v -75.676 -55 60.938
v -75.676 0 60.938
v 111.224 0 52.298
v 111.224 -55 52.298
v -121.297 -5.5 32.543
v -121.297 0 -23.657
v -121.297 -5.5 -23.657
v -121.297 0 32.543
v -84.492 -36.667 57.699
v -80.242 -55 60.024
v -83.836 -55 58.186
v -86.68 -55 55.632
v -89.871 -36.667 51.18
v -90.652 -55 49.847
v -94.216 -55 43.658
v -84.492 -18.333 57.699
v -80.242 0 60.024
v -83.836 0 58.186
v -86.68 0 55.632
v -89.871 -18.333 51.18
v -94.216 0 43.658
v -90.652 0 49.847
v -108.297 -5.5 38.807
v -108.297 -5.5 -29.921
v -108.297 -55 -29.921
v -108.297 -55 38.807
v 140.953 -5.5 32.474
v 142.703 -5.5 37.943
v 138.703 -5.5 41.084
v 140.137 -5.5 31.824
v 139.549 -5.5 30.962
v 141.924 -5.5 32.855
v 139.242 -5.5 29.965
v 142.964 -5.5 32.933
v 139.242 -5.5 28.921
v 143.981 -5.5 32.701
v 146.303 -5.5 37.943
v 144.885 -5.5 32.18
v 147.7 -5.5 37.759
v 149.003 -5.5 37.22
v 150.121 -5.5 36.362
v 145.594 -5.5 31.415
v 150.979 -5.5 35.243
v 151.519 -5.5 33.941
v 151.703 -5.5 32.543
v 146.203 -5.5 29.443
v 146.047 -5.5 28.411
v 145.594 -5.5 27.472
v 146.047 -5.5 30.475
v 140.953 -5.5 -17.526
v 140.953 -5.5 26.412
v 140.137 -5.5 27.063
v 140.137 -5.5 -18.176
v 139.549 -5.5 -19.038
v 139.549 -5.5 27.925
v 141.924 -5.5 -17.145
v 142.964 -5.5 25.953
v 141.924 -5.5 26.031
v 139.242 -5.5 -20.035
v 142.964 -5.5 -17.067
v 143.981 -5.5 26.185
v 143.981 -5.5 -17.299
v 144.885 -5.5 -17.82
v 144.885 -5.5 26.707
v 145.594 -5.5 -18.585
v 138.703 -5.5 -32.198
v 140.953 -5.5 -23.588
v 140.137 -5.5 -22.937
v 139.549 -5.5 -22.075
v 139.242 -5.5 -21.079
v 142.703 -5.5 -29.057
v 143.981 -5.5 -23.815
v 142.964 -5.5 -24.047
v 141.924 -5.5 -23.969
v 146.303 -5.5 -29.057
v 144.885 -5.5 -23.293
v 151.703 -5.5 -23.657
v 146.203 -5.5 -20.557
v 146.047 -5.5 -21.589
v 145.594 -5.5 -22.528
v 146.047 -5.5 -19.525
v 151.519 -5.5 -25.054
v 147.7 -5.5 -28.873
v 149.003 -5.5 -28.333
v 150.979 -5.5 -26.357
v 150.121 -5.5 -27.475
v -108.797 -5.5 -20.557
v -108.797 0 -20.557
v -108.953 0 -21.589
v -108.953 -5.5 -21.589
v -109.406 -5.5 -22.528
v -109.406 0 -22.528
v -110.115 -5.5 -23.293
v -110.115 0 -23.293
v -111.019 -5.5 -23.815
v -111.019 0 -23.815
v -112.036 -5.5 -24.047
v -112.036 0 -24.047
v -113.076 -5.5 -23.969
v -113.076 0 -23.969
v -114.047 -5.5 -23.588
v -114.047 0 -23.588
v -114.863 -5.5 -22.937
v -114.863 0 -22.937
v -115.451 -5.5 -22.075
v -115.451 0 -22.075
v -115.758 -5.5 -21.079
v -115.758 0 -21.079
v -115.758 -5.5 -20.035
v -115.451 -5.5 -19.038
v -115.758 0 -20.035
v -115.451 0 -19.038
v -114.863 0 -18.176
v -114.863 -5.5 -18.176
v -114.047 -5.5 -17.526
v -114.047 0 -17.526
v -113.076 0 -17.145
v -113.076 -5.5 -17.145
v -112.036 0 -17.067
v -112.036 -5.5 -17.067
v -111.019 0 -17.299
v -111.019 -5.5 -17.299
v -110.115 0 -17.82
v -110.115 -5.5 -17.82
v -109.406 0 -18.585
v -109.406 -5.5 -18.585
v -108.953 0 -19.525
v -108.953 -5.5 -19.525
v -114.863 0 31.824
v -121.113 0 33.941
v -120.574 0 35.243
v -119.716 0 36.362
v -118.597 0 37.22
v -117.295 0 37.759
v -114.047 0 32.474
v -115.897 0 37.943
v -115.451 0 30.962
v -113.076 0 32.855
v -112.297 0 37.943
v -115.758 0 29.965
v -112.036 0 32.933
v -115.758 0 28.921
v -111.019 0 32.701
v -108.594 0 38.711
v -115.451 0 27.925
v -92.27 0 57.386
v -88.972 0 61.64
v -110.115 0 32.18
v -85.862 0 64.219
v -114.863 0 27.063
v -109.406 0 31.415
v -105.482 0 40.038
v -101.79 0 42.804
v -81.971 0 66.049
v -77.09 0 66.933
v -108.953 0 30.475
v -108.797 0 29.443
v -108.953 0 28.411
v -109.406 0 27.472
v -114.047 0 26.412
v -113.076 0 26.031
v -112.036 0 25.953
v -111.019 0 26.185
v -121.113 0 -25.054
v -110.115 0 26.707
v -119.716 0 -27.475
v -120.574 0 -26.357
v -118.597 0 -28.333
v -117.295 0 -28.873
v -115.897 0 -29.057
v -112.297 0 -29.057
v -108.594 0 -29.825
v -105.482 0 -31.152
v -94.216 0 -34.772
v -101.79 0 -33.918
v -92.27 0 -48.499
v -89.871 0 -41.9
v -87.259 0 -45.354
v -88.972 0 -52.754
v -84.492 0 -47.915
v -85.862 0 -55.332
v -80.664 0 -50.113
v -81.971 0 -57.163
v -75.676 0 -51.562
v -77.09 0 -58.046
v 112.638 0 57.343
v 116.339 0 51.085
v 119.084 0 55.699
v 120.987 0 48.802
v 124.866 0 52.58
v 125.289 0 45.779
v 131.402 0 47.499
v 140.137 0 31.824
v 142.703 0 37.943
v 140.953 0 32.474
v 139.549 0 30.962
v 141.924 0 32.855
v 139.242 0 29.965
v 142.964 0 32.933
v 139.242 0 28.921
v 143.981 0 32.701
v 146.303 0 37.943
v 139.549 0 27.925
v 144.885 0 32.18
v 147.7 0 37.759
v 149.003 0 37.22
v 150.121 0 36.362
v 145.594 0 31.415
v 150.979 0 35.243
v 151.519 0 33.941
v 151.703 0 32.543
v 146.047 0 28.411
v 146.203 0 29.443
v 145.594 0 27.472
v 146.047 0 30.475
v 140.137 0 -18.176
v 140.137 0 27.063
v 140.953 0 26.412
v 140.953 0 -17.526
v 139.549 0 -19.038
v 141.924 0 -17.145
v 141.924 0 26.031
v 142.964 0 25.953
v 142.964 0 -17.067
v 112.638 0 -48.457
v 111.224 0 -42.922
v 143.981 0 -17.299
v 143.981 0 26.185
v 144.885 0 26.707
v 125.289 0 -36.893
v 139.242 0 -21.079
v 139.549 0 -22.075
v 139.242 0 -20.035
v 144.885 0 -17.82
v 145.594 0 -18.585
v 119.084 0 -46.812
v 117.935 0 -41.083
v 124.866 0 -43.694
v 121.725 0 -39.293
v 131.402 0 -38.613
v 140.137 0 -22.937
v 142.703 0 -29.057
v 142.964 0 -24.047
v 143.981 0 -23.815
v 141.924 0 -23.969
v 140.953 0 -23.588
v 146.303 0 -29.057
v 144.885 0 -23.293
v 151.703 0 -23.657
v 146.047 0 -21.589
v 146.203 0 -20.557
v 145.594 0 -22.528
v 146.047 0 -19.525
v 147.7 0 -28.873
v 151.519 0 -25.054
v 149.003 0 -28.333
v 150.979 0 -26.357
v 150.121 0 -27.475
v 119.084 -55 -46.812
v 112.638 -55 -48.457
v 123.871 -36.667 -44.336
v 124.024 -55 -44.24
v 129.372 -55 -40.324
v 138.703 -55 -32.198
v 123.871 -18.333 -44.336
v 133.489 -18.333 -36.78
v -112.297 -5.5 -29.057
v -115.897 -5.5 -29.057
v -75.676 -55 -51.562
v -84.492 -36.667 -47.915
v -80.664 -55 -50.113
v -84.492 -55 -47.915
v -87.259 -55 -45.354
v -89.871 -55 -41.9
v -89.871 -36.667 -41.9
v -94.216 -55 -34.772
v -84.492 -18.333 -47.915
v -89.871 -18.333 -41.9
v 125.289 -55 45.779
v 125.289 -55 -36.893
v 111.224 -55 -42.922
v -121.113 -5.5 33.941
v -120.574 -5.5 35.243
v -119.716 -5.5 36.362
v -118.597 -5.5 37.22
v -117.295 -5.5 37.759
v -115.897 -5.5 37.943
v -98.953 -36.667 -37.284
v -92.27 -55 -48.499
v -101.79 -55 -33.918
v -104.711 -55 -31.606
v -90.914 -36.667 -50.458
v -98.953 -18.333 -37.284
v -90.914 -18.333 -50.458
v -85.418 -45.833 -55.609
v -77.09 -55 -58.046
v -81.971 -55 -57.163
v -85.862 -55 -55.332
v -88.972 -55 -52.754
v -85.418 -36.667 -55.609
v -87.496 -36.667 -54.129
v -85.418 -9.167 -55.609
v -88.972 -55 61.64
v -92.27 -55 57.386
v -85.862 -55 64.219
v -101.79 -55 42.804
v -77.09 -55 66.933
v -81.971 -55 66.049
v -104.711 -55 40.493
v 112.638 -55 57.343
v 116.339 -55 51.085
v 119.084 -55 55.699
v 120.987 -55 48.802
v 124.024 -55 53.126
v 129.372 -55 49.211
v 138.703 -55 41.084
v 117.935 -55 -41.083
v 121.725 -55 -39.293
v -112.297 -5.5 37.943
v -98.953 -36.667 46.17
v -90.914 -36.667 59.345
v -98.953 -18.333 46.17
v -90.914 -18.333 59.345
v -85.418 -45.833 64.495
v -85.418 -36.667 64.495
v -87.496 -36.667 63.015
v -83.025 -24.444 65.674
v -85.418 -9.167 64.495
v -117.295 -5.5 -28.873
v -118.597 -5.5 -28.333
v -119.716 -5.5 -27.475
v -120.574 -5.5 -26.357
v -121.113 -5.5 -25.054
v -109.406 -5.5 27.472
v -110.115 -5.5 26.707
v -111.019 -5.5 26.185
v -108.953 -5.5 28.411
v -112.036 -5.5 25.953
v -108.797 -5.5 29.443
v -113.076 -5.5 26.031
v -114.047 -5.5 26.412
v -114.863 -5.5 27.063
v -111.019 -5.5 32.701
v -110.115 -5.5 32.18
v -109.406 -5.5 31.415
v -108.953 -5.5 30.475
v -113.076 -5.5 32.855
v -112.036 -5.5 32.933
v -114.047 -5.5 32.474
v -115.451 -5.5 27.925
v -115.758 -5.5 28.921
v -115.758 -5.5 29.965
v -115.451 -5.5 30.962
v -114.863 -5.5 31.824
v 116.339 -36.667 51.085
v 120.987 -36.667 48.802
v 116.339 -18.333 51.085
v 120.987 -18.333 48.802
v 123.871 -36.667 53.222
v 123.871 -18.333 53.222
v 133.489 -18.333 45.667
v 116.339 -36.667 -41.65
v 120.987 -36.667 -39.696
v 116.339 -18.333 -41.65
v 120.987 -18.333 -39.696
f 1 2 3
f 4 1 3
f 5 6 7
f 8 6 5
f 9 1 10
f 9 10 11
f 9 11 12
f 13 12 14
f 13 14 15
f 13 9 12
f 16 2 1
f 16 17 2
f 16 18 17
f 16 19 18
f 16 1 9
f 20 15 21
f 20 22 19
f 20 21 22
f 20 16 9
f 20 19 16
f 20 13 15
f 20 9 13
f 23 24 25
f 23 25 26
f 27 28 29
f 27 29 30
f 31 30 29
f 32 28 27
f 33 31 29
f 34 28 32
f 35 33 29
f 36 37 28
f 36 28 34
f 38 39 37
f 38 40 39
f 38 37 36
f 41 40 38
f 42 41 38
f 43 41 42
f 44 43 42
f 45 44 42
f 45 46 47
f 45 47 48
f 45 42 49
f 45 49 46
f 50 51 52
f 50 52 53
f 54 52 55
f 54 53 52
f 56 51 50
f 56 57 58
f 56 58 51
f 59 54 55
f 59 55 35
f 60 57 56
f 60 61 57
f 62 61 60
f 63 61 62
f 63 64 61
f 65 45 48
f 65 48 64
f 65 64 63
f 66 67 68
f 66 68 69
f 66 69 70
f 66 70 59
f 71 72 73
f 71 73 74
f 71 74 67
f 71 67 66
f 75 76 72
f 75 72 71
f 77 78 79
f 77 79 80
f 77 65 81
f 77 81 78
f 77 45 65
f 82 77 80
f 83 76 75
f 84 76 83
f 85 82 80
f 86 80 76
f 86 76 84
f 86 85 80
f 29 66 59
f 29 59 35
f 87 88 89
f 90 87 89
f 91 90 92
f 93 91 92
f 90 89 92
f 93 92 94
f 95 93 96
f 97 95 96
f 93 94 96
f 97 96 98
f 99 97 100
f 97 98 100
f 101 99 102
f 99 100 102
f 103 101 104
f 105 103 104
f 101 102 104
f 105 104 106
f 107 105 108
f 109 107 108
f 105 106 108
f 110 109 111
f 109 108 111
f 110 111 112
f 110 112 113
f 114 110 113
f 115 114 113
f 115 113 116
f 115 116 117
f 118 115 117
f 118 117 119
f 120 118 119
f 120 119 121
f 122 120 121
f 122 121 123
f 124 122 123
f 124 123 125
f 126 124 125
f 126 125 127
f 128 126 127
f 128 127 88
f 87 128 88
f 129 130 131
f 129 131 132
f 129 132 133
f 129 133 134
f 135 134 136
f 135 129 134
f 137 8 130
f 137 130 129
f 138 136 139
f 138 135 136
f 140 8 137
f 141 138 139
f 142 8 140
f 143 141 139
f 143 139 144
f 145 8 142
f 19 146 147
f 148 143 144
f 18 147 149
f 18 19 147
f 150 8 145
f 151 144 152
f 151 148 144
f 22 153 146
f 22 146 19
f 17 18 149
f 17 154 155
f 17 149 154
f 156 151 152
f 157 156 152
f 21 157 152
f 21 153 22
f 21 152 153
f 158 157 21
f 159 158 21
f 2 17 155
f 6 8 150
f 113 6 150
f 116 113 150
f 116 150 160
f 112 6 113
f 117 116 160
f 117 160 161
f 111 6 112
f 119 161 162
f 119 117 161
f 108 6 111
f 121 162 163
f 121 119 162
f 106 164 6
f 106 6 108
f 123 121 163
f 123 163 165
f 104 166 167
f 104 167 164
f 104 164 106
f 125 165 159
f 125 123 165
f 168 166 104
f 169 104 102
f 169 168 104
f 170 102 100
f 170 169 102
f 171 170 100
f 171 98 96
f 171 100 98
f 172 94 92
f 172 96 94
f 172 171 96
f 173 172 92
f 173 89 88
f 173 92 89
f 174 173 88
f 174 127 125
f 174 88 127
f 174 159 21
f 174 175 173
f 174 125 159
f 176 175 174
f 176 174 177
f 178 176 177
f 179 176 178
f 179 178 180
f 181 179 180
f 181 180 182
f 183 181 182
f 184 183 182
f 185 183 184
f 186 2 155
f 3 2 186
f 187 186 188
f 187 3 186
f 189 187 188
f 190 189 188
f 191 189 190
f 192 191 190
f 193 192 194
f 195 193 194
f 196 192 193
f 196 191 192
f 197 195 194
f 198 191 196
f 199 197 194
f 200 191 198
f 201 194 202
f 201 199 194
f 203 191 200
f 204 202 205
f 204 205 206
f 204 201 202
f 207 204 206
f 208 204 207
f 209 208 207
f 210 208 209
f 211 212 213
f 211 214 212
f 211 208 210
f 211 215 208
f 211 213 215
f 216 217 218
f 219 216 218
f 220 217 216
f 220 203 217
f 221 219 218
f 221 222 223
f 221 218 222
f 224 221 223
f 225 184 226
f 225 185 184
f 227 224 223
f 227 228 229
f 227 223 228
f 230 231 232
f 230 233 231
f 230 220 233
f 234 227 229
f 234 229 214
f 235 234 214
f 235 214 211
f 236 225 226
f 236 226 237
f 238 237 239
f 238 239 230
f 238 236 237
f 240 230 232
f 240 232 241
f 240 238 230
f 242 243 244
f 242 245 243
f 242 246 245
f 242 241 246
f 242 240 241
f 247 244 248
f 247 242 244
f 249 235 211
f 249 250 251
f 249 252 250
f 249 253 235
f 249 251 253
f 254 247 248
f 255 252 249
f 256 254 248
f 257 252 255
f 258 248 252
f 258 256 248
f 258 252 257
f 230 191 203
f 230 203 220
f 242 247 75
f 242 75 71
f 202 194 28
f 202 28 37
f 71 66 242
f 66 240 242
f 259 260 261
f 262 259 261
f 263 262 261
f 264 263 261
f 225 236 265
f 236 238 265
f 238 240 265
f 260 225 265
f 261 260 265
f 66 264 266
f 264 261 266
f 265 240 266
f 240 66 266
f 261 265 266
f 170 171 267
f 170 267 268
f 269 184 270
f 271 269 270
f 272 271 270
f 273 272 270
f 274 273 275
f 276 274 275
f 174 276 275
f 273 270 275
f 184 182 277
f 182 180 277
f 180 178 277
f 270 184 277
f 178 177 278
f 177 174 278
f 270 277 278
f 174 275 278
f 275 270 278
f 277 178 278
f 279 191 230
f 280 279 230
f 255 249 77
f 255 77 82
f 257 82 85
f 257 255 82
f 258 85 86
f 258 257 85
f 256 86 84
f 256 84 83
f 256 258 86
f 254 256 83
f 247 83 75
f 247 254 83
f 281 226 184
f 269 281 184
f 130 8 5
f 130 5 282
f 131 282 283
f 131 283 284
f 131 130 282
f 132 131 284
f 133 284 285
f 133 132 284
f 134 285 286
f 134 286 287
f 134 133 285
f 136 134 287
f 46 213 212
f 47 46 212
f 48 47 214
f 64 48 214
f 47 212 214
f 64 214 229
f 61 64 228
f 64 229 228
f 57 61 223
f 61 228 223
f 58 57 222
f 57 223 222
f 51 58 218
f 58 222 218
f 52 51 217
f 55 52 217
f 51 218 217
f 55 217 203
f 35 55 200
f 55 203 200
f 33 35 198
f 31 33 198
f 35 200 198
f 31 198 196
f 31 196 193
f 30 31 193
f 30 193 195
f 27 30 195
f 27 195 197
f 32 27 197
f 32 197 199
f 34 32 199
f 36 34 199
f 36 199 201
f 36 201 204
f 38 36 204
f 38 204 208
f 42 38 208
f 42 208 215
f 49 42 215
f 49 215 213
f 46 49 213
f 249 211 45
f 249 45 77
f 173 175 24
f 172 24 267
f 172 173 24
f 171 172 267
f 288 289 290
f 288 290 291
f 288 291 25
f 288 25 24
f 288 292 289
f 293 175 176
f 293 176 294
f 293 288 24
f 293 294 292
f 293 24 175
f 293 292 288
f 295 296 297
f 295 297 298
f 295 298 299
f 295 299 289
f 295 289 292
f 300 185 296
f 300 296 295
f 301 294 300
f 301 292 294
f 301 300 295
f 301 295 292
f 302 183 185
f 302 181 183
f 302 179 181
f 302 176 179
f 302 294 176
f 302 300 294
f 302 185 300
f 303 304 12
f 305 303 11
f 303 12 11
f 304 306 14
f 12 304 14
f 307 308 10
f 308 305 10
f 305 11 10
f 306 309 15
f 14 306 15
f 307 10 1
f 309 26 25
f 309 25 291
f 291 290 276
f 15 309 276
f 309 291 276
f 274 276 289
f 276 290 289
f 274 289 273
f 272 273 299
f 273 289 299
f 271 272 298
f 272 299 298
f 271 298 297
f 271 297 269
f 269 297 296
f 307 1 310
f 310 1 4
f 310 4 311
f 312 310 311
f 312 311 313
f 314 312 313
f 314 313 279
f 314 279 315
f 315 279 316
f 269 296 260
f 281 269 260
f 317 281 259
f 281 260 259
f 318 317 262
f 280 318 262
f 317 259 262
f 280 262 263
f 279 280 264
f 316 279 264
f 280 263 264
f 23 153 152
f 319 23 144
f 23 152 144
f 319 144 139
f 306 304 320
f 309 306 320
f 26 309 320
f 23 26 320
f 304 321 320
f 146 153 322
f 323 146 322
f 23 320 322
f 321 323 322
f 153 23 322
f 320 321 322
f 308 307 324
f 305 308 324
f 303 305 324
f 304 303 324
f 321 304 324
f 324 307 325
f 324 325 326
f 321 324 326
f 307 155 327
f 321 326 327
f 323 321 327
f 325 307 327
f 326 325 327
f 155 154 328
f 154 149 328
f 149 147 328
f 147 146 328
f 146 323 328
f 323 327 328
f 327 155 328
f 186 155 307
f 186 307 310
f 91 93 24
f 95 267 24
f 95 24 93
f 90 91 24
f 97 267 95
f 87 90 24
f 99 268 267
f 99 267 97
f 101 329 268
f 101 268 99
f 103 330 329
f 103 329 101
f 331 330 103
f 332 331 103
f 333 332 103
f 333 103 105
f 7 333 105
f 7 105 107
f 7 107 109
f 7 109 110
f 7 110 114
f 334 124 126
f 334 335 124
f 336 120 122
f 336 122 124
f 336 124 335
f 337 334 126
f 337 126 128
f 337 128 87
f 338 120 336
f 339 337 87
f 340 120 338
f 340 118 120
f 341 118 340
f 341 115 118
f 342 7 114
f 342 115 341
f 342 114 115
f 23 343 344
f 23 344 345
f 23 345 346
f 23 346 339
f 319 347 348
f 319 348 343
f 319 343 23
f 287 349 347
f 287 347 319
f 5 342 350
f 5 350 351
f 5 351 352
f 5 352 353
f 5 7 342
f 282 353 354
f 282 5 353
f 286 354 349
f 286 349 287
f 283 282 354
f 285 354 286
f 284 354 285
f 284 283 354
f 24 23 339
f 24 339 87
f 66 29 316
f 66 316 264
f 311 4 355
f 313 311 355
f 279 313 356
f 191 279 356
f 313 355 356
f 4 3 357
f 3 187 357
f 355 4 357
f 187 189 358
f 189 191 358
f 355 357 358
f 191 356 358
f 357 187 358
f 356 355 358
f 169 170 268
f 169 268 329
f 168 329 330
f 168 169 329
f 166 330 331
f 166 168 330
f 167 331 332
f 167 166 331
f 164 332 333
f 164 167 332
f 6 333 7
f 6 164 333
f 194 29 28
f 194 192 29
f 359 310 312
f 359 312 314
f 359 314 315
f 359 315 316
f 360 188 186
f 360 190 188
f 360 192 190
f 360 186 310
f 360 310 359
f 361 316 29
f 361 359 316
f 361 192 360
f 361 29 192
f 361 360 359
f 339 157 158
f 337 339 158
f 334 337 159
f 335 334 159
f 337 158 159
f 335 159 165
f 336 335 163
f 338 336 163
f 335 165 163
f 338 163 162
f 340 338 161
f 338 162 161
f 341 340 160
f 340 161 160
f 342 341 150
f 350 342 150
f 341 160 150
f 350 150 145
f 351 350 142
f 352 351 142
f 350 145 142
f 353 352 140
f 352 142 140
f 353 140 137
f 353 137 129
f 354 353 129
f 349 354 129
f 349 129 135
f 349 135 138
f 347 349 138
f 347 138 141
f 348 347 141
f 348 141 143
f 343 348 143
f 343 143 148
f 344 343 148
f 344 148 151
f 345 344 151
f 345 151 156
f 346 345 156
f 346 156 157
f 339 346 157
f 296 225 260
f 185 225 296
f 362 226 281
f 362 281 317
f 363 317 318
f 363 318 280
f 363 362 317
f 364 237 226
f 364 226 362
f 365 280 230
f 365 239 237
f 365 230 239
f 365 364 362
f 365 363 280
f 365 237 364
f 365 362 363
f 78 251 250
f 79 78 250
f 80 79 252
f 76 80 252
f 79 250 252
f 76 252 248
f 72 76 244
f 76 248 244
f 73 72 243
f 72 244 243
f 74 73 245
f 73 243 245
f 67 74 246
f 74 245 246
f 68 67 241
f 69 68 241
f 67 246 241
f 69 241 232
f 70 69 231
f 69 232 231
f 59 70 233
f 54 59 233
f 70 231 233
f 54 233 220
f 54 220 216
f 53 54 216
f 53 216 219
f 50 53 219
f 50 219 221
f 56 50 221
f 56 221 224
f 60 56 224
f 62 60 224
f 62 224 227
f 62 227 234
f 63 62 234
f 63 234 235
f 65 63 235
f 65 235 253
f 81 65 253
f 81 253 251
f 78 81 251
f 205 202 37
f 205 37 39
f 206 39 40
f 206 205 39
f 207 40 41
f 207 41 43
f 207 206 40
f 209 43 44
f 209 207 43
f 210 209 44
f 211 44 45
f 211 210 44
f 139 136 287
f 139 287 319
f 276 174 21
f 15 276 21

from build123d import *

# Parameters (mm, degrees)
SKETCH1_R           = 3.5
BOSS_EXTRUDE2_DEPTH = 55
SKETCH7_W           = 68.999652055
SKETCH7_H           = 50.415620377
CUT_EXTRUDE5_DEPTH  = 13
SKETCH19_W          = 74.859412742
SKETCH19_H          = 60.725118028
CUT_EXTRUDE7_DEPTH  = 13


with BuildPart() as part:
    # Sketch1 → Boss-Extrude2 (new body)
    with BuildSketch(Plane(origin=(0, 0, 0), x_dir=(1, 0, 0), z_dir=(0, 1, 0))):
        with BuildLine():
            Line((-77.08996548, -66.932643829), (112.637979465, -57.343127962))
            add(Edge.make_bspline(
                [(112.637979465, -57.343127962), (125.082628436, -56.027724614), (133.287763268, -44.662014668), (142.702606635, -37.943127962)],
                knots=[0, 0, 0, 0, 1, 1, 1, 1], degree=3))
            Line((142.702606635, -37.943127962), (146.202606635, -37.943127962))
            Line((146.202606635, -37.943127962), (146.302606635, -37.943127962))
            ThreePointArc((146.302606635, -37.943127962), (150.120983253, -36.36150458), (151.702606635, -32.543127962))
            Line((151.702606635, -32.543127962), (151.702606635, 23.656872038))
            ThreePointArc((151.702606635, 23.656872038), (150.120983253, 27.475248656), (146.302606635, 29.056872038))
            Line((146.302606635, 29.056872038), (146.202606635, 29.056872038))
            Line((146.202606635, 29.056872038), (142.702606635, 29.056872038))
            add(Edge.make_bspline(
                [(112.637979465, 48.456872038), (125.082628436, 47.14146869), (133.287763268, 35.775758744), (142.702606635, 29.056872038)],
                knots=[0, 0, 0, 0, 1, 1, 1, 1], degree=3))
            Line((112.637979465, 48.456872038), (-77.08996548, 58.046387905))
            add(Edge.make_bspline(
                [(-77.08996548, 58.046387905), (-97.502880255, 56.762508137), (-92.602876077, 31.29935649), (-112.297393365, 29.056872038)],
                knots=[0, 0, 0, 0, 1, 1, 1, 1], degree=3))
            Line((-112.297393365, 29.056872038), (-115.797393365, 29.056872038))
            Line((-115.797393365, 29.056872038), (-115.897393365, 29.056872038))
            ThreePointArc((-115.897393365, 29.056872038), (-119.715769983, 27.475248656), (-121.297393365, 23.656872038))
            Line((-121.297393365, 23.656872038), (-121.297393365, -32.543127962))
            ThreePointArc((-121.297393365, -32.543127962), (-119.715769983, -36.36150458), (-115.897393365, -37.943127962))
            Line((-115.897393365, -37.943127962), (-115.797393365, -37.943127962))
            Line((-115.797393365, -37.943127962), (-112.297393365, -37.943127962))
            add(Edge.make_bspline(
                [(-77.08996548, -66.932643829), (-97.502880255, -65.648764061), (-92.602876077, -40.185612414), (-112.297393365, -37.943127962)],
                knots=[0, 0, 0, 0, 1, 1, 1, 1], degree=3))
        make_face()
        with Locations((-112.297393365, 20.556872038)):
            Circle(SKETCH1_R, mode=Mode.SUBTRACT)
        with Locations((-112.297393365, -29.443127962)):
            Circle(SKETCH1_R, mode=Mode.SUBTRACT)
        with Locations((142.702606635, -29.443127962)):
            Circle(SKETCH1_R, mode=Mode.SUBTRACT)
        with Locations((142.702606635, 20.556872038)):
            Circle(SKETCH1_R, mode=Mode.SUBTRACT)
        with BuildLine():
            Line((-75.675939266, -60.937869235), (111.223953251, -52.297869235))
            add(Edge.make_bspline(
                [(111.223953251, -52.297869235), (116.613661153, -51.728175398), (121.119803585, -49.063877422), (125.288889488, -45.778967713)],
                knots=[0, 0, 0, 0, 0.481216011, 0.481216011, 0.481216011, 0.481216011], degree=3))
            Line((125.288889488, -45.778967713), (125.288889488, 36.892711789))
            add(Edge.make_bspline(
                [(111.223953251, 42.922130765), (116.613661153, 41.934143872), (121.119803585, 40.177621498), (125.288889488, 36.892711789)],
                knots=[0, 0, 0, 0, 0.481216011, 0.481216011, 0.481216011, 0.481216011], degree=3))
            Line((111.223953251, 42.922130765), (-75.675939266, 51.562130765))
            add(Edge.make_bspline(
                [(-75.675939266, 51.562130765), (-87.01186848, 49.517204736), (-89.586983119, 42.038204428), (-94.215939266, 34.771613311)],
                knots=[0, 0, 0, 0, 0.62412853, 0.62412853, 0.62412853, 0.62412853], degree=3))
            Line((-94.215939266, 34.771613311), (-94.215939266, -43.657869235))
            add(Edge.make_bspline(
                [(-75.675939266, -60.937869235), (-87.01186848, -60.09623443), (-89.586983119, -50.924460352), (-94.215939266, -43.657869235)],
                knots=[0, 0, 0, 0, 0.62412853, 0.62412853, 0.62412853, 0.62412853], degree=3))
        make_face(mode=Mode.SUBTRACT)
    extrude(amount=-BOSS_EXTRUDE2_DEPTH)

    # Sketch7 → Cut-Extrude5 (cut)
    with BuildSketch(Plane.ZY.offset(121.297393365)):
        with Locations((4.333112833, -30.707810189)):
            Rectangle(SKETCH7_W, SKETCH7_H)
    extrude(amount=-CUT_EXTRUDE5_DEPTH, mode=Mode.SUBTRACT)

    # Sketch19 → Cut-Extrude7 (cut)
    with BuildSketch(Plane(origin=(151.702606635, 0, 0), x_dir=(0, 0, -1), z_dir=(1, 0, 0))):
        with Locations((-5.097493458, -35.862559014)):
            Rectangle(SKETCH19_W, SKETCH19_H)
    extrude(amount=-CUT_EXTRUDE7_DEPTH, mode=Mode.SUBTRACT)


solid = part.part
